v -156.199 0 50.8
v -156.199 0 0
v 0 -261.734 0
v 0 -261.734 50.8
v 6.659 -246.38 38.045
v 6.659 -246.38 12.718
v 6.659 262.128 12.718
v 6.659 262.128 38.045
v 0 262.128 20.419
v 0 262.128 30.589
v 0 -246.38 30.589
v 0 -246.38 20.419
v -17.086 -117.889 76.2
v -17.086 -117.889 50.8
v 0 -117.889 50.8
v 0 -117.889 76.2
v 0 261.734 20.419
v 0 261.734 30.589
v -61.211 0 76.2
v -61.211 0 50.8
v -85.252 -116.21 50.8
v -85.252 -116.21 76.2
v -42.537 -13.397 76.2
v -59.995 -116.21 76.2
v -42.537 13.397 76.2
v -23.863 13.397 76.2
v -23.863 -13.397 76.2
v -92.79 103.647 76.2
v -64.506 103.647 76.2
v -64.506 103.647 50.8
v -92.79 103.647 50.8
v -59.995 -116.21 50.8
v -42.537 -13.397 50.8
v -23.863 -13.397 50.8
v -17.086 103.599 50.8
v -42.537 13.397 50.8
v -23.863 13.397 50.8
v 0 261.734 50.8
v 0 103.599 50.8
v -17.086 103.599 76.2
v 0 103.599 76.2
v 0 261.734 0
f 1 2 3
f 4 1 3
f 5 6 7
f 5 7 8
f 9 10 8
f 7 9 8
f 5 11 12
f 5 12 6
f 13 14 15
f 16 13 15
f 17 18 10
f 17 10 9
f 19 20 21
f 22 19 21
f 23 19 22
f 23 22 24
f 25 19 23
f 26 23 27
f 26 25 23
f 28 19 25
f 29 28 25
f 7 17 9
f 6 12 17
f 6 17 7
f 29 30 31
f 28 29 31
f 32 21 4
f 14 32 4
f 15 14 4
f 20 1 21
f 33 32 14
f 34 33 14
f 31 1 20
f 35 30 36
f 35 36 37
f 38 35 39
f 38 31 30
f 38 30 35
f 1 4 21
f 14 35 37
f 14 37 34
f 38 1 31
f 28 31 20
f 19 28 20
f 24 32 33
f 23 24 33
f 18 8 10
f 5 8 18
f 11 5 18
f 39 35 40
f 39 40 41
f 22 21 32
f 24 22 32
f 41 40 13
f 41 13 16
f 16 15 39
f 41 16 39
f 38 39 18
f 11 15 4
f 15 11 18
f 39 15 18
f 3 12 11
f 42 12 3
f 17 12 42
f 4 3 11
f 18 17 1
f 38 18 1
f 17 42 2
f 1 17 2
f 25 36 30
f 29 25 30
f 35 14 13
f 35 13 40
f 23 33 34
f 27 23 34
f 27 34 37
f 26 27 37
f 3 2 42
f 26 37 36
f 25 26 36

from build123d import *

# Parameters (mm, degrees)
F1_DEPTH = 50.8
F3_W     = 17.0859034664
F3_H     = 221.488
F4_DEPTH = 25.4
F8_DEPTH = 508.508


with BuildPart() as f1:
    # F0 (on Top) → F1 (new body)
    with BuildSketch(Plane.XY):
        Polygon((0, -261.7343), (0, 261.7343), (-156.1992195996, 0), align=None)
    extrude(amount=F1_DEPTH)

    # F3 (on offset) → F4 (join)
    with BuildSketch(Plane.XY.offset(50.8)):
        with Locations((-8.5429517332, -7.1447751335)):
            Rectangle(F3_W, F3_H)
        Polygon((-42.5371713936, -13.3966989815), (-23.862991482, -13.3966989815), (-23.862991482, 13.3966989815), (-42.5371713936, 13.3966989815), (-61.2113513052, 13.3966989815), (-61.2113513052, 0), (-61.2113513052, -13.3966989815), align=None)
        Polygon((-59.9951921275, -116.2100359797), (-42.5371713936, -13.3966989815), (-61.2113513052, -13.3966989815), (-61.2113513052, 0), (-85.2522104979, -116.2100359797), align=None)
        Polygon((-61.2113513052, 13.3966989815), (-42.5371713936, 13.3966989815), (-64.5063391738, 103.6467850208), (-92.7901566029, 103.6467850208), (-61.2113513052, 0), align=None)
    extrude(amount=F4_DEPTH)

    # F7 (on offset) → F8 (join)
    with BuildSketch(Plane.XZ.offset(246.38)):
        Polygon((0, 30.5890981108), (0, 20.4187799245), (6.6587165929, 12.7179827541), (6.6587165929, 38.0452573299), align=None)
    extrude(amount=-F8_DEPTH)


solid = f1.part
